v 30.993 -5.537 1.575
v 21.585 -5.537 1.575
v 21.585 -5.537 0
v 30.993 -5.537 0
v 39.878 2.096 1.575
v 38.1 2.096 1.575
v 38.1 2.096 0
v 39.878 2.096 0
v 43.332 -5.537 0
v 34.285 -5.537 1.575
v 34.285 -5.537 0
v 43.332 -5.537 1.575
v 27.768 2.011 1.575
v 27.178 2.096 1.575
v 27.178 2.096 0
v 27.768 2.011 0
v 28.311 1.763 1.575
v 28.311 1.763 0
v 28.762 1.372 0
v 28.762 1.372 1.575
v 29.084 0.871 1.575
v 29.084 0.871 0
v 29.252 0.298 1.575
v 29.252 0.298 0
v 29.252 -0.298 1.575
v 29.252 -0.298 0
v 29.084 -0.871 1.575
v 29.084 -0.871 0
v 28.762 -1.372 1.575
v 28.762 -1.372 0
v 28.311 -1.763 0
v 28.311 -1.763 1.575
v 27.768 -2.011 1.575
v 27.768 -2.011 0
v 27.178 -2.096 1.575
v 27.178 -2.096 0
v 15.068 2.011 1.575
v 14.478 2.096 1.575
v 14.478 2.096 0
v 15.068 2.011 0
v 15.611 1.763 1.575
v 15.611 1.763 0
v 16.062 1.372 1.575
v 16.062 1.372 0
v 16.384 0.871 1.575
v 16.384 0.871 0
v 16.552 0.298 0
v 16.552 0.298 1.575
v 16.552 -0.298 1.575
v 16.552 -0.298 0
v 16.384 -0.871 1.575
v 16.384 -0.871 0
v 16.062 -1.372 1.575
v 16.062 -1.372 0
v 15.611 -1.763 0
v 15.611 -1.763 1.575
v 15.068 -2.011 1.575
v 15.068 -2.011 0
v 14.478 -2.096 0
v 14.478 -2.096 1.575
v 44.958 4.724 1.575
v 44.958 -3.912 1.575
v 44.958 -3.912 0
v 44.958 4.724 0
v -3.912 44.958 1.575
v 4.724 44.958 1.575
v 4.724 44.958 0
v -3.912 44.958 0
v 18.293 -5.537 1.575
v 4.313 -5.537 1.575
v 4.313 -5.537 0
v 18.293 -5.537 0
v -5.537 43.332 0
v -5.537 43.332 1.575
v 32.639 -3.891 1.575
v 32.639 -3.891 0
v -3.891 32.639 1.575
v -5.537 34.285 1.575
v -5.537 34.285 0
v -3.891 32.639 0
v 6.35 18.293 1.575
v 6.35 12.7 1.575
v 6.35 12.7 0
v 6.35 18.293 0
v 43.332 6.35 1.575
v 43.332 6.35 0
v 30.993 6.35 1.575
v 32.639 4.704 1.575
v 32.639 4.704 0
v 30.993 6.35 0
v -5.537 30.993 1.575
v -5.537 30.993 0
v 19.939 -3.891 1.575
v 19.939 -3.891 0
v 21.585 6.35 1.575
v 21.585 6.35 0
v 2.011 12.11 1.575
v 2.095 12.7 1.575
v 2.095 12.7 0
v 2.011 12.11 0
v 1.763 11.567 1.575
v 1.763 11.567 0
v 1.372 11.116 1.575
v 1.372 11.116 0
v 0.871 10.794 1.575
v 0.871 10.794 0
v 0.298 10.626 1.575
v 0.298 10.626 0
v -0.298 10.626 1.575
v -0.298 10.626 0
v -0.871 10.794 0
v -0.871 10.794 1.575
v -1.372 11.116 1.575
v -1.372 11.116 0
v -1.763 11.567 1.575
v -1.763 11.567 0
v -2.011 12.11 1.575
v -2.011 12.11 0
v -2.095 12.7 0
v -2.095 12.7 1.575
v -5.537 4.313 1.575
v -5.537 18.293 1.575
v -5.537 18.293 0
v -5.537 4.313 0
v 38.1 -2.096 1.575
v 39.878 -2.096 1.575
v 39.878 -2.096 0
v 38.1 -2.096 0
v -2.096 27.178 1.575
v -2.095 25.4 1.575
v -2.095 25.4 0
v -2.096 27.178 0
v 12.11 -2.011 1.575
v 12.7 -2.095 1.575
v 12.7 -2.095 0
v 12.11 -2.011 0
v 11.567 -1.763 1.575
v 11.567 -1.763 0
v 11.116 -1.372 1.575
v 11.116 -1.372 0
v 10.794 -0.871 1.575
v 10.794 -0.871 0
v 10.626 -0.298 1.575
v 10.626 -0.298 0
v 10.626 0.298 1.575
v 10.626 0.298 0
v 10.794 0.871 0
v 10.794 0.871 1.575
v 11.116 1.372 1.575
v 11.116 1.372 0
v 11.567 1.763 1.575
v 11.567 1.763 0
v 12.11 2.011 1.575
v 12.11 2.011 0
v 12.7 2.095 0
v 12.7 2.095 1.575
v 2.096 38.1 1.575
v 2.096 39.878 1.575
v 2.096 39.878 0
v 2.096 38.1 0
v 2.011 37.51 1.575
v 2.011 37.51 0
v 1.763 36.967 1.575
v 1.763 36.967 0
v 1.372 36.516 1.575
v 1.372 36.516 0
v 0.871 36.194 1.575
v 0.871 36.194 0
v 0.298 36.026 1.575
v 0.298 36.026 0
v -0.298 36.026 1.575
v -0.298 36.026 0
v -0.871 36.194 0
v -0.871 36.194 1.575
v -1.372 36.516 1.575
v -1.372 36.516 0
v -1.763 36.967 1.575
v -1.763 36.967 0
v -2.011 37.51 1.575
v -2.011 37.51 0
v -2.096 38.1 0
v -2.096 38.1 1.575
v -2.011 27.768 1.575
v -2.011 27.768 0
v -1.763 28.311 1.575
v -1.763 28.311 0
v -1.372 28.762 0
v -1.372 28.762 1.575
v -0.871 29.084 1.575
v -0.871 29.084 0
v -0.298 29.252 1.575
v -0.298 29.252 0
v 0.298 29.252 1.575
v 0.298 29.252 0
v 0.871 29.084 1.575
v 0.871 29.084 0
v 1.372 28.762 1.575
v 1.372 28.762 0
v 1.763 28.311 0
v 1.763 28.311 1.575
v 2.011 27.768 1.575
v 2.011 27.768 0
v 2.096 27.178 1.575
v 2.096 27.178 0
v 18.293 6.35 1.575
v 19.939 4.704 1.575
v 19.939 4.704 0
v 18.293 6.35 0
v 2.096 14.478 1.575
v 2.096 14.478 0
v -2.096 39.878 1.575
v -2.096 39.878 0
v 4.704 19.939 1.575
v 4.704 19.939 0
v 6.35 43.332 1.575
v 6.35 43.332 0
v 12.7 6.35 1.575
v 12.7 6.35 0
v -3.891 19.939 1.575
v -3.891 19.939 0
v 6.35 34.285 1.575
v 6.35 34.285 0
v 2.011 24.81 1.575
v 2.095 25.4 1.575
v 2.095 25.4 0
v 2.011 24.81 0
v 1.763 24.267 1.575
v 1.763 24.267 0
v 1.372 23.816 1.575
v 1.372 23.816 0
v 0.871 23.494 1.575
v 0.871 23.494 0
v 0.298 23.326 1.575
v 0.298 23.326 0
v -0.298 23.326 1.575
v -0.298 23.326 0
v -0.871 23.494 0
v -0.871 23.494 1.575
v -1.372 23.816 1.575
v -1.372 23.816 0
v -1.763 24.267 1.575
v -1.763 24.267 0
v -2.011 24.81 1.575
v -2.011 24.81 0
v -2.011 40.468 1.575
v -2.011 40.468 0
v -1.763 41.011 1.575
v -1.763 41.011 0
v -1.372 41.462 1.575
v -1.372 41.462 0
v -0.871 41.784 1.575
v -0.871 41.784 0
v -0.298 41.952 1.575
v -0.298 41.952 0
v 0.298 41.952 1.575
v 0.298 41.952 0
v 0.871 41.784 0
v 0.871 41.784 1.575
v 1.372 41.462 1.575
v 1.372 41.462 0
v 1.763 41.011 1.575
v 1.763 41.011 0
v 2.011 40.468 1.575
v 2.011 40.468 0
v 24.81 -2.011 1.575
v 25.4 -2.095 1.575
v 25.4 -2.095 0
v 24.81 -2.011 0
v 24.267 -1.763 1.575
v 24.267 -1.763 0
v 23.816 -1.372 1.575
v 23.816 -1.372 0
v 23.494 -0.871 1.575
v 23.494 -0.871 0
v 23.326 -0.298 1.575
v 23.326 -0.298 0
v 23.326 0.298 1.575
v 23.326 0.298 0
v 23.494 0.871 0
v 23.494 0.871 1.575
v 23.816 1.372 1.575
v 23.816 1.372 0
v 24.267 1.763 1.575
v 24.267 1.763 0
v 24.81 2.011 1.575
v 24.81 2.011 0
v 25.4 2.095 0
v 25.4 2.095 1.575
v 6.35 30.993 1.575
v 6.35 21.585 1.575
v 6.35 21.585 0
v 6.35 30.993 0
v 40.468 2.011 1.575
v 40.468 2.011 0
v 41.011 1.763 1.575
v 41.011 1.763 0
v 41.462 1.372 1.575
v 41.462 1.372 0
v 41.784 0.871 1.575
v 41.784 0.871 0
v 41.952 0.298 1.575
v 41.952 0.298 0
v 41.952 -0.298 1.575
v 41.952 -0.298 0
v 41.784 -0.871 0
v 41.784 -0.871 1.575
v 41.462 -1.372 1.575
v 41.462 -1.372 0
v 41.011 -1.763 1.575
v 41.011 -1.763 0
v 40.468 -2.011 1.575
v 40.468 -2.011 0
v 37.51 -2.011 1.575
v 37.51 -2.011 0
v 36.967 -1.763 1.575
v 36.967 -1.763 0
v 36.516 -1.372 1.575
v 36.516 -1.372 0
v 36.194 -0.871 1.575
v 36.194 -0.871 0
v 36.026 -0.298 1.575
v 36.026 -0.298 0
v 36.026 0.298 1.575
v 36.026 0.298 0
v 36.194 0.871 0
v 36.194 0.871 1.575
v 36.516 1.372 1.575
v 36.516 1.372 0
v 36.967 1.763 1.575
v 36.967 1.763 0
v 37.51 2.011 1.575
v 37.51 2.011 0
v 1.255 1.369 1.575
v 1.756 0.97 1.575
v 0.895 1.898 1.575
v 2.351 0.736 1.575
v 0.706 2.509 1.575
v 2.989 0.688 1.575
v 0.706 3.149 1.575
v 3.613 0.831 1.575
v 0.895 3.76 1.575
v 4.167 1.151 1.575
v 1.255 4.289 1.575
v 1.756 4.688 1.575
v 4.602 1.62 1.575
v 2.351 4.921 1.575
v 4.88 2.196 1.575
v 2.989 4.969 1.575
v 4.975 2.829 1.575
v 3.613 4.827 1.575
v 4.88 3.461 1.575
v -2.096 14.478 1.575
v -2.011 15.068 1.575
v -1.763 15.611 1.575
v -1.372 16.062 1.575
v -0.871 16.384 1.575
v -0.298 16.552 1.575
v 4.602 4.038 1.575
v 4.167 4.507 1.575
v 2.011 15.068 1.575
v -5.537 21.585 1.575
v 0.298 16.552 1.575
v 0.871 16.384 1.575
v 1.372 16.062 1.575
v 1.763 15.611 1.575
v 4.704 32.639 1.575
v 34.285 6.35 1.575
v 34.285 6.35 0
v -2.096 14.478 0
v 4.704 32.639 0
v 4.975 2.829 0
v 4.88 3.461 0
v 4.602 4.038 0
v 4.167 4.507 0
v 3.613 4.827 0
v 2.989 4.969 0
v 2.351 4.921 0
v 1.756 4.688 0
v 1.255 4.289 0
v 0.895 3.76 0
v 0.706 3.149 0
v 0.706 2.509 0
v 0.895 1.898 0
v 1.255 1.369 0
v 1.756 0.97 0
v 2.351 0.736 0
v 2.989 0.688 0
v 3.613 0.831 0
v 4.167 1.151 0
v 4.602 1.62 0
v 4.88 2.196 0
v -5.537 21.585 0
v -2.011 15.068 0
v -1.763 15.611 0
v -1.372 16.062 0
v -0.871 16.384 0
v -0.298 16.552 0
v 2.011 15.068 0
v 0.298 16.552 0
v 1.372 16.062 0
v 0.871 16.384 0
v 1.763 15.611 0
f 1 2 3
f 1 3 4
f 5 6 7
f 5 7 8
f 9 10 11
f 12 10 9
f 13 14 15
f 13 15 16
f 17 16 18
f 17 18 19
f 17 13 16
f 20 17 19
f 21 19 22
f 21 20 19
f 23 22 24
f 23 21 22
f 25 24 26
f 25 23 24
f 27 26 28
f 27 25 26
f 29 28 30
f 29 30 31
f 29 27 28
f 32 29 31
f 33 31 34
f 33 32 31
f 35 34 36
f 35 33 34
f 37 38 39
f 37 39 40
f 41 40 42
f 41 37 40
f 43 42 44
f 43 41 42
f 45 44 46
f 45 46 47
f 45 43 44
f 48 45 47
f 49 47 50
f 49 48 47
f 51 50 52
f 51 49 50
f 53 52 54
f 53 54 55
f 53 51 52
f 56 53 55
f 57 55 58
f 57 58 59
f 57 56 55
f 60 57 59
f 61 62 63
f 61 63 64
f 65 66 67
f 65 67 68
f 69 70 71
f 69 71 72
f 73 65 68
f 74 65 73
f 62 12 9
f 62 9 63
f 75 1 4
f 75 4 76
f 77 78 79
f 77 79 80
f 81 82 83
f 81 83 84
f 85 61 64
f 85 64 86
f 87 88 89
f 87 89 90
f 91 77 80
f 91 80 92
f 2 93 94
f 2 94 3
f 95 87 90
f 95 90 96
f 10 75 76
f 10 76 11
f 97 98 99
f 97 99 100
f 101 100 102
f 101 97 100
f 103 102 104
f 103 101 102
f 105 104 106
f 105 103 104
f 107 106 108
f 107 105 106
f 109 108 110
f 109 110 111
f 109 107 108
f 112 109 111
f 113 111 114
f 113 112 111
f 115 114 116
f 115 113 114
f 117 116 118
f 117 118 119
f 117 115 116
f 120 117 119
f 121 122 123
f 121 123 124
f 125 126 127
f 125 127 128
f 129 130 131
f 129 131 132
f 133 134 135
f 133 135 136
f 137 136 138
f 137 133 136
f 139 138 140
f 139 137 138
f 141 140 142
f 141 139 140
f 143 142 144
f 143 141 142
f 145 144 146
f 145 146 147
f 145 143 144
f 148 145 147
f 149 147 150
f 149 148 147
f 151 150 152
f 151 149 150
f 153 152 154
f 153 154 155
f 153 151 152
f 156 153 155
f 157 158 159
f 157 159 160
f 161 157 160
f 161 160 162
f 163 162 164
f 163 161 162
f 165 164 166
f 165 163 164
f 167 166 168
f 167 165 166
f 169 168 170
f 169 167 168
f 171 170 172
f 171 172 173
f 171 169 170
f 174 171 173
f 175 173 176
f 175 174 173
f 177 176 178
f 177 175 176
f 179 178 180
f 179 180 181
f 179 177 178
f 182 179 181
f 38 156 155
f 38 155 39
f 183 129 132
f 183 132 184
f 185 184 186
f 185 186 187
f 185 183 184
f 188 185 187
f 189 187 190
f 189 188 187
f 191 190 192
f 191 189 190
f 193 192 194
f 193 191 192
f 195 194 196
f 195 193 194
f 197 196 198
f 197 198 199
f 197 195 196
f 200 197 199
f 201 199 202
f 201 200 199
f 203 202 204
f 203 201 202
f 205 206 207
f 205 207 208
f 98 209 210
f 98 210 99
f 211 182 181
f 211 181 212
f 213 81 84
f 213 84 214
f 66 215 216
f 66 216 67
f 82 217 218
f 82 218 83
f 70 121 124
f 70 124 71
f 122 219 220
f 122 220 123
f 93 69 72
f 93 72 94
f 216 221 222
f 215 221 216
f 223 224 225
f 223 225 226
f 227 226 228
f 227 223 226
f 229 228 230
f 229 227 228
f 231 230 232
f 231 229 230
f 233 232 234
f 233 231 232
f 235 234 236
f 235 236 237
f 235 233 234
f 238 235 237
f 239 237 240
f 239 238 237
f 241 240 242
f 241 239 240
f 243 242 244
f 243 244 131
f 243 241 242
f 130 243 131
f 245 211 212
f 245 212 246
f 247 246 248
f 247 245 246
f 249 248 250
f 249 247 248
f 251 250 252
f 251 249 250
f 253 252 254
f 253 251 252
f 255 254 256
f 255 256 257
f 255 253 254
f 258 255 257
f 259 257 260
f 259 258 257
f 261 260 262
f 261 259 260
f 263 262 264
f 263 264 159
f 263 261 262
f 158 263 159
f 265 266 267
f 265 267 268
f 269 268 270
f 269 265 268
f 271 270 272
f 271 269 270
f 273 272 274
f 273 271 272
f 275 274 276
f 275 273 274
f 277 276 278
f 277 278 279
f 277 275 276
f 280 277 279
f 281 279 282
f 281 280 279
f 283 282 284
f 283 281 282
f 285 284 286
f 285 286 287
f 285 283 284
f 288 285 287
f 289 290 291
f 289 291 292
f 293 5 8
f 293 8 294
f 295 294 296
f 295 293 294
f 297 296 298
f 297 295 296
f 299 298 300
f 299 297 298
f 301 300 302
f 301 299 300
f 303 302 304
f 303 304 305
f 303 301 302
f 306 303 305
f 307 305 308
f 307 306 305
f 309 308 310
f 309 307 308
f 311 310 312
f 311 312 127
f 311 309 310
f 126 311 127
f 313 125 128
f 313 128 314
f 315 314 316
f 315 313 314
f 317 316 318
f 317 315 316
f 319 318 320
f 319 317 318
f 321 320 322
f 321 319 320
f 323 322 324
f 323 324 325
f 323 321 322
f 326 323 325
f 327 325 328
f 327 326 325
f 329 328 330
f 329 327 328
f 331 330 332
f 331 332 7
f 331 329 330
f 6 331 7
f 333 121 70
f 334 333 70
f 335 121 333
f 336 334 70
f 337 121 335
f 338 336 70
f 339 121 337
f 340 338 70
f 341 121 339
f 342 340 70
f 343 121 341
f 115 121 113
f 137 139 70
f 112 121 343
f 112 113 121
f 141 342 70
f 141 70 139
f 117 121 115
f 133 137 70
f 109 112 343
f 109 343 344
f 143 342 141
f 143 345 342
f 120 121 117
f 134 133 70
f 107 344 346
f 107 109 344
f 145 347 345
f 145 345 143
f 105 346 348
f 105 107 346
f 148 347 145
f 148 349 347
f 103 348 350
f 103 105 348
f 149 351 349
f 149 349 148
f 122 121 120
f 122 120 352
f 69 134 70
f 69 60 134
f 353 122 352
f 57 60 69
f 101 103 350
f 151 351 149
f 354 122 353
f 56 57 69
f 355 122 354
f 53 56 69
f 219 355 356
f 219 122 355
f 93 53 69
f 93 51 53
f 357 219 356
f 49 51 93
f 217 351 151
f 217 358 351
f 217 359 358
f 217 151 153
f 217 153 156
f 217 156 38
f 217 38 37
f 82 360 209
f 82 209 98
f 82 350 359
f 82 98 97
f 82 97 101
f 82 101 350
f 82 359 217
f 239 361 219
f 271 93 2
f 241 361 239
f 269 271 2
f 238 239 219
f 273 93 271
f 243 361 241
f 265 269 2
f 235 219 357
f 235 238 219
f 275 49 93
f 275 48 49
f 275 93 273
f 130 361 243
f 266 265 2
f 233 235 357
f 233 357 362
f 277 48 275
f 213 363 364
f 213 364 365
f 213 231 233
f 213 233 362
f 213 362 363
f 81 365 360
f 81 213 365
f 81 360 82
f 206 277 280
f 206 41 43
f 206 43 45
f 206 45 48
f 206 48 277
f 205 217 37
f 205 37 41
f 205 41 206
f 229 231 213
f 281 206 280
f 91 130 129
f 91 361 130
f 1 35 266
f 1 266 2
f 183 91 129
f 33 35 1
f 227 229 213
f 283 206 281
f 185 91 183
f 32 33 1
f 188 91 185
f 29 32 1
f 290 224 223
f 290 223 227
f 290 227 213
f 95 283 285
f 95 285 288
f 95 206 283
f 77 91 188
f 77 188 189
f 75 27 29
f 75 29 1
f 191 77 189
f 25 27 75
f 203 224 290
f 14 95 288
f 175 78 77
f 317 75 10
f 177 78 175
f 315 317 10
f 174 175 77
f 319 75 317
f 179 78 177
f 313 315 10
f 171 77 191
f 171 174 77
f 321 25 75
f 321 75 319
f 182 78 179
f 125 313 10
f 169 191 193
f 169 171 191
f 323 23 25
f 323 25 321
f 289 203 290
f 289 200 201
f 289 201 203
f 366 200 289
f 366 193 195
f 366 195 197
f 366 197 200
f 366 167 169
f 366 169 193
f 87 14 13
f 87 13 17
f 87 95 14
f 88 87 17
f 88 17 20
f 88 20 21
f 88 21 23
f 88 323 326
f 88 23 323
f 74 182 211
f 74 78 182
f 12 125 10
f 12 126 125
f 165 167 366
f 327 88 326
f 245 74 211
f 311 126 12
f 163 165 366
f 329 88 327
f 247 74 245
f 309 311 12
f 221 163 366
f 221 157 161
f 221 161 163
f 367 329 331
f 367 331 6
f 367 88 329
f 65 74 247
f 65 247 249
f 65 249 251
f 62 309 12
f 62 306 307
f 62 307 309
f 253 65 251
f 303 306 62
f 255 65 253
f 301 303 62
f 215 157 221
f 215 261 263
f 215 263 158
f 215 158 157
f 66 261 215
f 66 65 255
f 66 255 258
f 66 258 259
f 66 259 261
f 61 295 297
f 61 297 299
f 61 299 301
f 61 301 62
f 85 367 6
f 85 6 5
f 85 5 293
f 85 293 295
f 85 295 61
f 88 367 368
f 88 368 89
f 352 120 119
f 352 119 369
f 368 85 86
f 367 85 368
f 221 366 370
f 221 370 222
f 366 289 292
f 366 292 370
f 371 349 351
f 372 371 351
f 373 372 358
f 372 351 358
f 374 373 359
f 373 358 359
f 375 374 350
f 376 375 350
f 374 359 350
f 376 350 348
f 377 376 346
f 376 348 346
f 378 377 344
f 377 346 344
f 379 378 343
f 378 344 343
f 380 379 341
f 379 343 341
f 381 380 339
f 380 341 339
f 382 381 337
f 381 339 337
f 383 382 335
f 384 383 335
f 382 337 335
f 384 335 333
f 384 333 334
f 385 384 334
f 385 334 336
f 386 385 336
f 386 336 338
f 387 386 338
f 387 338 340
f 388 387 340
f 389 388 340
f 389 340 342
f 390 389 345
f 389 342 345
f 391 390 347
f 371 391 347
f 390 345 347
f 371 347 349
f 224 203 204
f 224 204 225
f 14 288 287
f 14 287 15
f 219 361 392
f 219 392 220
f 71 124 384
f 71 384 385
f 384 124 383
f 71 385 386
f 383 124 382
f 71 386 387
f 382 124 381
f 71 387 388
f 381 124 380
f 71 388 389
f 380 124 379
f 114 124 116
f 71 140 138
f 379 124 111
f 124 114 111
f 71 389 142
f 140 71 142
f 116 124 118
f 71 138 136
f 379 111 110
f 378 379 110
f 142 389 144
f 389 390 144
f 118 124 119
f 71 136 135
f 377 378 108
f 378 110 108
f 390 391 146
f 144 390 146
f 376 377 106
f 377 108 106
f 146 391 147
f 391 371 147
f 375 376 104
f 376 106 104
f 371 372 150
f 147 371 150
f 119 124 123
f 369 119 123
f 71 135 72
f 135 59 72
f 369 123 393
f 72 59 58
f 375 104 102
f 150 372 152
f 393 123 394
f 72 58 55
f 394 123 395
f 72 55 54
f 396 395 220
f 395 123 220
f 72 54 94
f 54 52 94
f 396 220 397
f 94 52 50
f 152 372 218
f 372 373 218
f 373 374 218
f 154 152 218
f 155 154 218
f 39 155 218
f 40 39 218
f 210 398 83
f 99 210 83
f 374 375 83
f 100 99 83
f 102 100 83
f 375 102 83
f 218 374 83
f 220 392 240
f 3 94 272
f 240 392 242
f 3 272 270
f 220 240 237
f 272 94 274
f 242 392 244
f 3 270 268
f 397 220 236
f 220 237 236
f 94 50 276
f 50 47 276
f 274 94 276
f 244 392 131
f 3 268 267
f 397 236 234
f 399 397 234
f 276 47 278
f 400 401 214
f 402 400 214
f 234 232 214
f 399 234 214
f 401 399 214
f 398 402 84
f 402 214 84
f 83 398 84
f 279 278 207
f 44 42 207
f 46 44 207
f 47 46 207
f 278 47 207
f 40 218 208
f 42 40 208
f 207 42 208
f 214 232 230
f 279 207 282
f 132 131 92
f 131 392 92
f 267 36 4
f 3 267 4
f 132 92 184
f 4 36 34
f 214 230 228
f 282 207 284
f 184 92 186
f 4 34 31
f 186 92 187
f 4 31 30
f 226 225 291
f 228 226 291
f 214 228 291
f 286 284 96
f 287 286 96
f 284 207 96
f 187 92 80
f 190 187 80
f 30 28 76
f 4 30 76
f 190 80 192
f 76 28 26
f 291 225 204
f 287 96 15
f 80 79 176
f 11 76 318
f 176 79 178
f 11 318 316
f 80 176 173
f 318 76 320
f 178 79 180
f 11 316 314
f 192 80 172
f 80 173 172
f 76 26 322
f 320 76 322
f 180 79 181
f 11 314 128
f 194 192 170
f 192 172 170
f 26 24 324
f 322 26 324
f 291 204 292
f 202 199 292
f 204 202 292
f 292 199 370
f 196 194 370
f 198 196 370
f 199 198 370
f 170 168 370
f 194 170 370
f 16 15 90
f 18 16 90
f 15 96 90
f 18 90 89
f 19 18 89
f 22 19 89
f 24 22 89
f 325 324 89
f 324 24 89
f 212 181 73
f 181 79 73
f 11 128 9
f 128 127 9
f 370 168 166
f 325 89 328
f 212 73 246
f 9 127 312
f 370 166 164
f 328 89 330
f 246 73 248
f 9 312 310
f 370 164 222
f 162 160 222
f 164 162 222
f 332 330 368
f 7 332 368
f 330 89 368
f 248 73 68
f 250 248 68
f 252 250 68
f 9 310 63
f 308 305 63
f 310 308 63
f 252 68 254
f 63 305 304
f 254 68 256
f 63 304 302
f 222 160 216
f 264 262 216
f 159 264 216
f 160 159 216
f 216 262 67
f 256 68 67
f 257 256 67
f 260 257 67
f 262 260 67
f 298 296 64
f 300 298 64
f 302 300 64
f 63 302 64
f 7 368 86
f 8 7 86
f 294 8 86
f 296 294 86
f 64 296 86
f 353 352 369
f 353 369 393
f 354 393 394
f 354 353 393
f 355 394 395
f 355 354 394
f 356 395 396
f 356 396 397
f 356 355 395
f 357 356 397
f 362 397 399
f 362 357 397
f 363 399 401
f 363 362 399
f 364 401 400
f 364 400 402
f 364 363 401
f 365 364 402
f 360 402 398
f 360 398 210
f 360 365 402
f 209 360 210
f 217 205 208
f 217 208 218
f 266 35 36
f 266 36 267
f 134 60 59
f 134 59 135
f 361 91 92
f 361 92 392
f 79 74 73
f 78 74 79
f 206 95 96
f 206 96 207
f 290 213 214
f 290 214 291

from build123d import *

# Parameters (mm, degrees)
SKETCH1_R           = 2.1463
BOSS_EXTRUDE1_DEPTH = 1.5748


with BuildPart() as part:
    # Sketch1 → Boss-Extrude1 (new body)
    with BuildSketch(Plane.XY.offset(1.5748)):
        Polygon((6.35, 34.284985055), (6.35, 43.3324), (4.7244, 44.958), (-3.9116, 44.958), (-5.5372, 43.3324), (-5.5372, 34.284985055), (-3.891214945, 32.639), (-5.5372, 30.993014945), (-5.5372, 21.584985055), (-3.891214945, 19.939), (-5.5372, 18.293014945), (-5.5372, 4.313373781), (4.313373781, -5.5372), (18.293014945, -5.5372), (19.939, -3.891214945), (21.584985055, -5.5372), (30.993014945, -5.5372), (32.639, -3.891214945), (34.284985055, -5.5372), (43.3324, -5.5372), (44.958, -3.9116), (44.958, 4.7244), (43.3324, 6.35), (34.284985055, 6.35), (32.639, 4.704014945), (30.993014945, 6.35), (21.584985055, 6.35), (19.939, 4.704014945), (18.293014945, 6.35), (12.7, 6.35), (6.35, 12.7), (6.35, 18.293014945), (4.704014945, 19.939), (6.35, 21.584985055), (6.35, 30.993014945), (4.704014945, 32.639), align=None)
        with Locations((2.828780678, 2.828780678)):
            Circle(SKETCH1_R, mode=Mode.SUBTRACT)
        with BuildLine():
            Line((12.7, 2.0955), (14.478, 2.0955))
            ThreePointArc((14.478, 2.0955), (16.5735, 0), (14.478, -2.0955))
            Line((14.478, -2.0955), (12.7, -2.0955))
            ThreePointArc((12.7, -2.0955), (10.6045, 0), (12.7, 2.0955))
        make_face(mode=Mode.SUBTRACT)
        with BuildLine():
            Line((-2.0955, 38.1), (-2.0955, 39.878))
            ThreePointArc((-2.0955, 39.878), (0, 41.9735), (2.0955, 39.878))
            Line((2.0955, 39.878), (2.0955, 38.1))
            ThreePointArc((2.0955, 38.1), (0, 36.0045), (-2.0955, 38.1))
        make_face(mode=Mode.SUBTRACT)
        with BuildLine():
            Line((-2.0955, 12.7), (-2.0955, 14.478))
            ThreePointArc((-2.0955, 14.478), (0, 16.5735), (2.0955, 14.478))
            Line((2.0955, 14.478), (2.0955, 12.7))
            ThreePointArc((2.0955, 12.7), (0, 10.6045), (-2.0955, 12.7))
        make_face(mode=Mode.SUBTRACT)
        with BuildLine():
            Line((-2.0955, 25.4), (-2.0955, 27.178))
            ThreePointArc((-2.0955, 27.178), (0, 29.2735), (2.0955, 27.178))
            Line((2.0955, 27.178), (2.0955, 25.4))
            ThreePointArc((2.0955, 25.4), (0, 23.3045), (-2.0955, 25.4))
        make_face(mode=Mode.SUBTRACT)
        with BuildLine():
            Line((25.4, 2.0955), (27.178, 2.0955))
            ThreePointArc((27.178, 2.0955), (29.2735, 0), (27.178, -2.0955))
            Line((27.178, -2.0955), (25.4, -2.0955))
            ThreePointArc((25.4, -2.0955), (23.3045, 0), (25.4, 2.0955))
        make_face(mode=Mode.SUBTRACT)
        with BuildLine():
            Line((38.1, 2.0955), (39.878, 2.0955))
            ThreePointArc((39.878, 2.0955), (41.9735, 0), (39.878, -2.0955))
            Line((39.878, -2.0955), (38.1, -2.0955))
            ThreePointArc((38.1, -2.0955), (36.0045, 0), (38.1, 2.0955))
        make_face(mode=Mode.SUBTRACT)
    extrude(amount=-BOSS_EXTRUDE1_DEPTH)


solid = part.part
